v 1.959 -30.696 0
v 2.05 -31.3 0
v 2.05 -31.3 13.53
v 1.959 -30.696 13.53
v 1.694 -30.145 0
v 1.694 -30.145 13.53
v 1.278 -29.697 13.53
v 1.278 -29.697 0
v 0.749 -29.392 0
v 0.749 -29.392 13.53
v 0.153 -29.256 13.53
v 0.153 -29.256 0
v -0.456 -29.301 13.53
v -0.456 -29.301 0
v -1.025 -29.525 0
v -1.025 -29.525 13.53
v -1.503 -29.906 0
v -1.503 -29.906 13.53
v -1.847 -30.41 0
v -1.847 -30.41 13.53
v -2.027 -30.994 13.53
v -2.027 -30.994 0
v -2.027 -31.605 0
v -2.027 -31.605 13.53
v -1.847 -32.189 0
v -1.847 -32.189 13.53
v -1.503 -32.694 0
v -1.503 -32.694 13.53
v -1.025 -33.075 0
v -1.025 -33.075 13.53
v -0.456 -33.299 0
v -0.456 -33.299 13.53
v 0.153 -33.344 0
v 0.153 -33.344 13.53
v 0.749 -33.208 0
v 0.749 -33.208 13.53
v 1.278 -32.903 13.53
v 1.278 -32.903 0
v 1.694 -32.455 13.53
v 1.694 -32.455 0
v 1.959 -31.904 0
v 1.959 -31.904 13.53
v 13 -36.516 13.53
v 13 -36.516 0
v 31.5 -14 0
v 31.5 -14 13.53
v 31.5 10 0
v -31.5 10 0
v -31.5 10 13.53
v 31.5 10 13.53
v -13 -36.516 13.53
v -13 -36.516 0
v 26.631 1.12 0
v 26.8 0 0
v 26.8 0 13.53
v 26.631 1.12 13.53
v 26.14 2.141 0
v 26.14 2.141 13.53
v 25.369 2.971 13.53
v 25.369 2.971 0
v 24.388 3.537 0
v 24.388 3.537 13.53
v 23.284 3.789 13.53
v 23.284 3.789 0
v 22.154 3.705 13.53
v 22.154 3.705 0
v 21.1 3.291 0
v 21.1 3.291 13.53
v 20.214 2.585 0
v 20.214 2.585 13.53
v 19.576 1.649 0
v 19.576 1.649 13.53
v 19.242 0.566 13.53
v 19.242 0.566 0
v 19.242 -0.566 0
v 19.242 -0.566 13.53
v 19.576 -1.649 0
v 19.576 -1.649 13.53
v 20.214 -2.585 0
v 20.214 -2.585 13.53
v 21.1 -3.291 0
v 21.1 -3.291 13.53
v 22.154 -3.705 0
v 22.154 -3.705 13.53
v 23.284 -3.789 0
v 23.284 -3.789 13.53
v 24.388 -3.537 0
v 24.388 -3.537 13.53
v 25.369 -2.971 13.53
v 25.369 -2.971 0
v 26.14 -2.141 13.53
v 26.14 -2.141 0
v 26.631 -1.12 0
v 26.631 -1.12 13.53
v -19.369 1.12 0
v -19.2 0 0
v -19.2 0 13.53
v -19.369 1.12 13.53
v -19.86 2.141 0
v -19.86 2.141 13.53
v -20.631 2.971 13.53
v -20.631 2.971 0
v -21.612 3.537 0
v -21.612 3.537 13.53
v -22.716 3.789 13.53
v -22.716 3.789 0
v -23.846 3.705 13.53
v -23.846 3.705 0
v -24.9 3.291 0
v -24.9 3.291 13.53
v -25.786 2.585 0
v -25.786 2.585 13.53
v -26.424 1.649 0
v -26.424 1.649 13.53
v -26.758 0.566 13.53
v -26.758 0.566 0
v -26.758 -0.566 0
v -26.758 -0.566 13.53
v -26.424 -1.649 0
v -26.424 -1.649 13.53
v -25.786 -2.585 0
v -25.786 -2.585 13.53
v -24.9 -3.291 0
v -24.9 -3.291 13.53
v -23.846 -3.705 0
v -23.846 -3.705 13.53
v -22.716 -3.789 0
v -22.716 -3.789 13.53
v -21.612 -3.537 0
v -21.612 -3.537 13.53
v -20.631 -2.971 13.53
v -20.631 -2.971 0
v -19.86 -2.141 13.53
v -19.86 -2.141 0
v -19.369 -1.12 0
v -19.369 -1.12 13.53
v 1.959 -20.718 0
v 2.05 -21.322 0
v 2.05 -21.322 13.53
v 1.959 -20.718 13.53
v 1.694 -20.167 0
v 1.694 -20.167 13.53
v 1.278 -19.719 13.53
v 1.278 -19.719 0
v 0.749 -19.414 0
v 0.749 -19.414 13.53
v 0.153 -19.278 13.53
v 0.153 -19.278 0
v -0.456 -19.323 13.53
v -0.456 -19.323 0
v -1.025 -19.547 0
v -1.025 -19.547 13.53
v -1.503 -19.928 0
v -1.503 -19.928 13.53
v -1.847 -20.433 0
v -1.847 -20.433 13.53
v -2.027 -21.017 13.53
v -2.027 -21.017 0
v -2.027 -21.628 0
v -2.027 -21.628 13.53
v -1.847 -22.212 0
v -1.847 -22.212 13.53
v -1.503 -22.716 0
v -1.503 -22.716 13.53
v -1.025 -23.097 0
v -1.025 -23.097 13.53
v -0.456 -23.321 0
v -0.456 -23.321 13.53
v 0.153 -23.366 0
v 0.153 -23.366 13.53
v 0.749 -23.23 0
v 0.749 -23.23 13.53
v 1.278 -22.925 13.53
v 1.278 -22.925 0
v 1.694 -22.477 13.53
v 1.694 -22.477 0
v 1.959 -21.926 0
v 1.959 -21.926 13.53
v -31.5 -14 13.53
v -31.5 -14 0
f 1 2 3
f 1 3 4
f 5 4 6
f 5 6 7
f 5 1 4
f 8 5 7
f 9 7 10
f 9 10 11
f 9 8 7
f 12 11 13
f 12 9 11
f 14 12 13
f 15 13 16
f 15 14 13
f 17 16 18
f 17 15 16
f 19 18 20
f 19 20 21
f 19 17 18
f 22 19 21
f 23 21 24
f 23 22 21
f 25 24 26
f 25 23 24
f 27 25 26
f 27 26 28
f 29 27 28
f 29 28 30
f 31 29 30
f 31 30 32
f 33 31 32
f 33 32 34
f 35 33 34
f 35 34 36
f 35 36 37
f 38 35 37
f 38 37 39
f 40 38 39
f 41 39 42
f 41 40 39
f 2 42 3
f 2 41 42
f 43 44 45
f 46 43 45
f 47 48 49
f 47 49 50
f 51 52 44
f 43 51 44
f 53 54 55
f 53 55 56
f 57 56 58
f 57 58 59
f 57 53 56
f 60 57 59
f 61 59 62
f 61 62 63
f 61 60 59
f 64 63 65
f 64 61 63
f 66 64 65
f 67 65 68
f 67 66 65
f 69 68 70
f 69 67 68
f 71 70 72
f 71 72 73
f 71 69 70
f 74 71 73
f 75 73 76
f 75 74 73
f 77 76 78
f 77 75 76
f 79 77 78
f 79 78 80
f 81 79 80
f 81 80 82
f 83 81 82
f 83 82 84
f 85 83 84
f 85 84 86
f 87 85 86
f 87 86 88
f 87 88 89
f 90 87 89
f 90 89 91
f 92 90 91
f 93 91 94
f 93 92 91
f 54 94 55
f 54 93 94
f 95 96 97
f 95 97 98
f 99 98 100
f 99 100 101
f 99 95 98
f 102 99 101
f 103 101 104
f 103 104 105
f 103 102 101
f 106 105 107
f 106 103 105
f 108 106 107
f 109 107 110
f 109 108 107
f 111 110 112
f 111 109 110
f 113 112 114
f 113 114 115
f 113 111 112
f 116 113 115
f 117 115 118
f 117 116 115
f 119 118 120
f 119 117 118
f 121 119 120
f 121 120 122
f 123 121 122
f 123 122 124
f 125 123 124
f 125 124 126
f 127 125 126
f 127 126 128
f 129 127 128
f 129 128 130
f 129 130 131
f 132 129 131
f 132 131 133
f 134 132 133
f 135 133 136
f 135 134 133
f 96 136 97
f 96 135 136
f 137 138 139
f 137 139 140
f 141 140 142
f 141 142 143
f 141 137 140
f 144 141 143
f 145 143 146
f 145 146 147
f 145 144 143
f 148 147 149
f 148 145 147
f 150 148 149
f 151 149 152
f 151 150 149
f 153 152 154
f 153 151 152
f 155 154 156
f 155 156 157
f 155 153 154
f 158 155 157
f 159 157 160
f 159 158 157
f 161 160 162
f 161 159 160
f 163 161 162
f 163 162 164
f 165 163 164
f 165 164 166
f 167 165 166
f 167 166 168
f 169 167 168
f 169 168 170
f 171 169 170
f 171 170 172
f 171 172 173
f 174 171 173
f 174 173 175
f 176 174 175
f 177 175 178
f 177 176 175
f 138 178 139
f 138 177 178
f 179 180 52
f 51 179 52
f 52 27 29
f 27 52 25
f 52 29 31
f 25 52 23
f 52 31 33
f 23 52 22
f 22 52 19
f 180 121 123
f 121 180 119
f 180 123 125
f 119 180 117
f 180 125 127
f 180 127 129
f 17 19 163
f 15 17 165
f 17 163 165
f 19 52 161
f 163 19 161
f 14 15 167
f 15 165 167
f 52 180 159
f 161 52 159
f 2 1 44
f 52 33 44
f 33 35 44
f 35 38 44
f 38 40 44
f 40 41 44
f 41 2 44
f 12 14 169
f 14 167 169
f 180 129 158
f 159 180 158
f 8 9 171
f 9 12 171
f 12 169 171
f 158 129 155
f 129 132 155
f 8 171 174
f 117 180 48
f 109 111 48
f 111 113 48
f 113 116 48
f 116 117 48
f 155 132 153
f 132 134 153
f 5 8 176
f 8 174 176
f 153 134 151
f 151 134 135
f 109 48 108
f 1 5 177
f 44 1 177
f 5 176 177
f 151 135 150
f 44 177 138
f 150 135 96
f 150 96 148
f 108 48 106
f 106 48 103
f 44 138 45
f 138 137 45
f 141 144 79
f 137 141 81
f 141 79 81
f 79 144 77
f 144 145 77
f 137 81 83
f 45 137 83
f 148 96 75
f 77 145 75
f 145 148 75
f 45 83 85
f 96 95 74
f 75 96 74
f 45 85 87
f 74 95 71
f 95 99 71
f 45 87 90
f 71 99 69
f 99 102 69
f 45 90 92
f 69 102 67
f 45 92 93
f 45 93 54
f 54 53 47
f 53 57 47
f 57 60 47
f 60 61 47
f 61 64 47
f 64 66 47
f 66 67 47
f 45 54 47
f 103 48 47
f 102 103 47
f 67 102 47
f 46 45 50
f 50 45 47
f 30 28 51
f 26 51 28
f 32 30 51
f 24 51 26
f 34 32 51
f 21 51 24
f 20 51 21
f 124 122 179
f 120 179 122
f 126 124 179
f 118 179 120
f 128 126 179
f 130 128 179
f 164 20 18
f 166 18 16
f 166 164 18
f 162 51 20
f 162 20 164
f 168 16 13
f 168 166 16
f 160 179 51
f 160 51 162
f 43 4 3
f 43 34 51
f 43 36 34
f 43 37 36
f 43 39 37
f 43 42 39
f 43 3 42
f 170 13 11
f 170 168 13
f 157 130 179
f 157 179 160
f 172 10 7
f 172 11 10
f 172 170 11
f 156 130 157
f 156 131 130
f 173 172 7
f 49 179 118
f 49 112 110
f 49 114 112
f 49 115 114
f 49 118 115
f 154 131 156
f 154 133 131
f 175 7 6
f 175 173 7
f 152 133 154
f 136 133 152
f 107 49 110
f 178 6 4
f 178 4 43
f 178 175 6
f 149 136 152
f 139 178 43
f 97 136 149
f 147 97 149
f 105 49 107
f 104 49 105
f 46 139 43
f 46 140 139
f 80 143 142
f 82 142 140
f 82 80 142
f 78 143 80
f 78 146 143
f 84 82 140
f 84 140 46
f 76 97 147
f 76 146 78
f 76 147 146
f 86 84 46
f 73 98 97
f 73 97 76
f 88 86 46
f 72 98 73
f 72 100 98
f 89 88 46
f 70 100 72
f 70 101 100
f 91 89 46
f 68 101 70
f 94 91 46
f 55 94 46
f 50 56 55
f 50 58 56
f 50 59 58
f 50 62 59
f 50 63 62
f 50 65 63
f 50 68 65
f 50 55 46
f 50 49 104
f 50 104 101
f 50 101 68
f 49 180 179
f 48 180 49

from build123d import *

# Parameters (mm, degrees)
SKETCH1_W           = 63
SKETCH1_H           = 24
SKETCH1_R           = 3.8
BOSS_EXTRUDE1_DEPTH = 13.53
SKETCH1_3_R         = 2.05
BOSS_EXTRUDE2_DEPTH = 13.53


with BuildPart() as part:
    # Sketch1 → Boss-Extrude1 (new body)
    with BuildSketch(Plane.XY):
        with Locations((0, -2)):
            Rectangle(SKETCH1_W, SKETCH1_H)
        with Locations((-23, 0)):
            Circle(SKETCH1_R, mode=Mode.SUBTRACT)
        with Locations((23, 0)):
            Circle(SKETCH1_R, mode=Mode.SUBTRACT)
    extrude(amount=BOSS_EXTRUDE1_DEPTH)

    # Sketch1<3> → Boss-Extrude2 (add)
    with BuildSketch(Plane.XY):
        Polygon((13, -36.51566868), (31.5, -14), (-31.5, -14), (-13, -36.51566868), (0, -36.51566868), align=None)
        with Locations((0, -31.299955557)):
            Circle(SKETCH1_3_R, mode=Mode.SUBTRACT)
        with Locations((0, -21.322069584)):
            Circle(SKETCH1_3_R, mode=Mode.SUBTRACT)
    extrude(amount=BOSS_EXTRUDE2_DEPTH)


solid = part.part
